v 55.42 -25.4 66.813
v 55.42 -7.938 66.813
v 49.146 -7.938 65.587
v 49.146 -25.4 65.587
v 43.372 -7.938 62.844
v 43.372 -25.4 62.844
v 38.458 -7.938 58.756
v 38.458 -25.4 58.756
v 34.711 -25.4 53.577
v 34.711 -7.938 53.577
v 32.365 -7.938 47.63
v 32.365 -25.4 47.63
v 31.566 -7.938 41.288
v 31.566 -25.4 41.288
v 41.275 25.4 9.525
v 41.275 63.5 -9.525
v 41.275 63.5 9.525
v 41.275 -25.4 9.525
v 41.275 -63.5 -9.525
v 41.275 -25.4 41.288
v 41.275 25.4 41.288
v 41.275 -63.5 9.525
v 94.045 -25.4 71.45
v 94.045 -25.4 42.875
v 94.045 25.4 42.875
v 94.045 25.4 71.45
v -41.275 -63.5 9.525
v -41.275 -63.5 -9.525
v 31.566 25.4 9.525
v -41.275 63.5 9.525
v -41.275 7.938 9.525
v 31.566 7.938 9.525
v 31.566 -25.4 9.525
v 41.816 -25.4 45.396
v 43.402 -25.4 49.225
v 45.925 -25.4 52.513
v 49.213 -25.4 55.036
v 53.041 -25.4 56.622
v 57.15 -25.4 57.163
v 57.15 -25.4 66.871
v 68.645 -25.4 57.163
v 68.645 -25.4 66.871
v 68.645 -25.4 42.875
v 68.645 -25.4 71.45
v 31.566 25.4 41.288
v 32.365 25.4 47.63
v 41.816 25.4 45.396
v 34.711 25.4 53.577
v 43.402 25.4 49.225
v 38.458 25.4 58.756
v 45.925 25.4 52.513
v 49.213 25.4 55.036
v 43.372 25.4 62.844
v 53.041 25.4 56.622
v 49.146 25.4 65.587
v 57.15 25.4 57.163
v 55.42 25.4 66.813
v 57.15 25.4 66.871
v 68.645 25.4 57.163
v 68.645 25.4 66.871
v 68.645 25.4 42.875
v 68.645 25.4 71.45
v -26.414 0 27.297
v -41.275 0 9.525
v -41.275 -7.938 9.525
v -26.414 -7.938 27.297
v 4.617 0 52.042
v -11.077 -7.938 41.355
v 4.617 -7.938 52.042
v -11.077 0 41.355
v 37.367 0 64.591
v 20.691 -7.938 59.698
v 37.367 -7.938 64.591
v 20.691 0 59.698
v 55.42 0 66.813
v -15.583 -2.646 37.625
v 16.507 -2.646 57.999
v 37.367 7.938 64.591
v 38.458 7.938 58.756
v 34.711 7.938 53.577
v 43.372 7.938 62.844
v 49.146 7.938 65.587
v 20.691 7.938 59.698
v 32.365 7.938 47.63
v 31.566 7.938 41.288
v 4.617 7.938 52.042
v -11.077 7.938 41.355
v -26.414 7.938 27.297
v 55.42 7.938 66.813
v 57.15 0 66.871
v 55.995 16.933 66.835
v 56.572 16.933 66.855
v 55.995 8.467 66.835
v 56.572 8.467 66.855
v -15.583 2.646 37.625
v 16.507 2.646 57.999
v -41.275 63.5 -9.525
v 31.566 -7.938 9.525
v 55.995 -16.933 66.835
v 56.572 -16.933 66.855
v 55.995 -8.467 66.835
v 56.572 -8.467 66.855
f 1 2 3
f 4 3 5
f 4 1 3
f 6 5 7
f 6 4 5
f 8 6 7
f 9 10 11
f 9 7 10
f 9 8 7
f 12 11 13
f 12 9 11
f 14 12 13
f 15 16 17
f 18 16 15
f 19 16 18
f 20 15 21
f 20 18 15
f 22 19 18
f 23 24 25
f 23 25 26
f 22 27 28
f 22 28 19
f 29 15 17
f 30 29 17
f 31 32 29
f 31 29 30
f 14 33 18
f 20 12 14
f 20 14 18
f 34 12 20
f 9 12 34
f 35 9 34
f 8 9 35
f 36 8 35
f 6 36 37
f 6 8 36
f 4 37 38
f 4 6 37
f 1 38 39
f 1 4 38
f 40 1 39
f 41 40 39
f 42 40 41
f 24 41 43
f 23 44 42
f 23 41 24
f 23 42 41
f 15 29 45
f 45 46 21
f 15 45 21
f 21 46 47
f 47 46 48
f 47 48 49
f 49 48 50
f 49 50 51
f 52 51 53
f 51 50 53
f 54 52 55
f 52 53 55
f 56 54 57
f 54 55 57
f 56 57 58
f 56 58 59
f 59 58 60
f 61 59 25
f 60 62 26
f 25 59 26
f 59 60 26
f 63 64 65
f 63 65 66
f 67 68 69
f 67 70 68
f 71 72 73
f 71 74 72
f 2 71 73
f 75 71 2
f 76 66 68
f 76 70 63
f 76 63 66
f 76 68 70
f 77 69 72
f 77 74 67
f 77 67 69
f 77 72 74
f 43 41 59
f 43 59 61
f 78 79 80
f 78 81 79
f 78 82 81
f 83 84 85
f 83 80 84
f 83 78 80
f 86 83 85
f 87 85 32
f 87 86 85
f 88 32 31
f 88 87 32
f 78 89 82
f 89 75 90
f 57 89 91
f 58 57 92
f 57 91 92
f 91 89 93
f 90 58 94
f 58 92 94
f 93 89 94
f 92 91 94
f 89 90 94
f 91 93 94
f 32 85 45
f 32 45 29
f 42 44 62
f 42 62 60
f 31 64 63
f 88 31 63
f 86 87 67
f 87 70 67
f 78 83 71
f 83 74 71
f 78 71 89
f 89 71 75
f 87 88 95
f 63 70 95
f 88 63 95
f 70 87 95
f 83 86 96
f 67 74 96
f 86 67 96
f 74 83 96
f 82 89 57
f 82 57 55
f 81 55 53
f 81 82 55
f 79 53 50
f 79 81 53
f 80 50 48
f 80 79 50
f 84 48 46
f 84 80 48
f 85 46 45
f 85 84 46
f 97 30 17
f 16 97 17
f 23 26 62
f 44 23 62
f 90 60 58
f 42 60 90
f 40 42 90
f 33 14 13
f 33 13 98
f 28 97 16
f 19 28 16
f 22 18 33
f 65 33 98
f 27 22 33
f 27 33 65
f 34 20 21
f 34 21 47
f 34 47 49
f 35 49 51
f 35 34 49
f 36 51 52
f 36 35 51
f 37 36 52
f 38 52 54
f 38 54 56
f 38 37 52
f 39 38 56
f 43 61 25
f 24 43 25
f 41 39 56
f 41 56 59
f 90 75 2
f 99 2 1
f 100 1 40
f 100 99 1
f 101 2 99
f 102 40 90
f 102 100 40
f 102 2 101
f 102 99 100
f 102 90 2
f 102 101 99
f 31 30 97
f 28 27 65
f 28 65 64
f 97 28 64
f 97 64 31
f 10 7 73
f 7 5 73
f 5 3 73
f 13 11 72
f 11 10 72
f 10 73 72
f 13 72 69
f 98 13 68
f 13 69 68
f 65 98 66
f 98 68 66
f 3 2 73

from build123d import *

# Parameters (mm, degrees)
F1_DEPTH = 63.5
F2_DEPTH = 25.4
F3_DEPTH = 7.9375
F4_DEPTH = 25.4


with BuildPart() as f1:
    # F0 (on Front) → F1 (new body, symmetric)
    with BuildSketch(Plane.XZ):
        Polygon((-41.275, 9.525), (-41.275, -9.525), (41.275, -9.525), (41.275, 9.525), (31.566352, 9.525), align=None)
    extrude(amount=F1_DEPTH, both=True)

    # F0 (on Front) → F2 (join, symmetric)
    with BuildSketch(Plane.XZ):
        with BuildLine():
            Line((31.566352, 9.525), (41.275, 9.525))
            Line((41.275, 9.525), (41.275, 41.2877))
            ThreePointArc((41.275, 41.2877), (45.92468, 52.51302), (57.15, 57.1627))
            Line((57.15, 57.1627), (68.645397, 57.1627))
            Line((68.645397, 57.1627), (68.645397, 66.871348))
            Line((68.645397, 66.871348), (57.15, 66.871348))
            add(Edge.make_bspline(
                [(55.419964, 66.812786), (55.99465, 66.83655), (56.571327, 66.856085), (57.15, 66.871348)],
                knots=[112.39165, 112.39165, 112.39165, 112.39165, 113.912617, 113.912617, 113.912617, 113.912617], degree=3))
            ThreePointArc((55.419964, 66.812786), (38.457974, 58.755705), (31.566352, 41.2877))
            Line((31.566352, 41.2877), (31.566352, 9.525))
        make_face()
    extrude(amount=F2_DEPTH, both=True)

    # F0 (on Front) → F3 (join, symmetric)
    with BuildSketch(Plane.XZ):
        with BuildLine():
            add(Edge.make_bspline(
                [(-41.275, 9.525), (-18.64041, 40.209658), (12.953615, 65.056772), (55.419964, 66.812786)],
                knots=[0, 0, 0, 0, 112.39165, 112.39165, 112.39165, 112.39165], degree=3))
            Line((-41.275, 9.525), (31.566352, 9.525))
            Line((31.566352, 9.525), (31.566352, 41.2877))
            ThreePointArc((31.566352, 41.2877), (38.457974, 58.755705), (55.419964, 66.812786))
        make_face()
    extrude(amount=F3_DEPTH, both=True)

    # F0 (on Front) → F4 (join, symmetric)
    with BuildSketch(Plane.XZ):
        Polygon((68.645397, 71.4502), (68.645397, 66.871348), (68.645397, 57.1627), (68.645397, 42.8752), (85.446604, 42.8752), (84.830329, 71.4502), align=None)
        Polygon((94.045397, 71.4502), (84.830329, 71.4502), (85.446604, 42.8752), (94.045397, 42.8752), (94.045397, 57.1627), align=None)
    extrude(amount=F4_DEPTH, both=True)


solid = f1.part
